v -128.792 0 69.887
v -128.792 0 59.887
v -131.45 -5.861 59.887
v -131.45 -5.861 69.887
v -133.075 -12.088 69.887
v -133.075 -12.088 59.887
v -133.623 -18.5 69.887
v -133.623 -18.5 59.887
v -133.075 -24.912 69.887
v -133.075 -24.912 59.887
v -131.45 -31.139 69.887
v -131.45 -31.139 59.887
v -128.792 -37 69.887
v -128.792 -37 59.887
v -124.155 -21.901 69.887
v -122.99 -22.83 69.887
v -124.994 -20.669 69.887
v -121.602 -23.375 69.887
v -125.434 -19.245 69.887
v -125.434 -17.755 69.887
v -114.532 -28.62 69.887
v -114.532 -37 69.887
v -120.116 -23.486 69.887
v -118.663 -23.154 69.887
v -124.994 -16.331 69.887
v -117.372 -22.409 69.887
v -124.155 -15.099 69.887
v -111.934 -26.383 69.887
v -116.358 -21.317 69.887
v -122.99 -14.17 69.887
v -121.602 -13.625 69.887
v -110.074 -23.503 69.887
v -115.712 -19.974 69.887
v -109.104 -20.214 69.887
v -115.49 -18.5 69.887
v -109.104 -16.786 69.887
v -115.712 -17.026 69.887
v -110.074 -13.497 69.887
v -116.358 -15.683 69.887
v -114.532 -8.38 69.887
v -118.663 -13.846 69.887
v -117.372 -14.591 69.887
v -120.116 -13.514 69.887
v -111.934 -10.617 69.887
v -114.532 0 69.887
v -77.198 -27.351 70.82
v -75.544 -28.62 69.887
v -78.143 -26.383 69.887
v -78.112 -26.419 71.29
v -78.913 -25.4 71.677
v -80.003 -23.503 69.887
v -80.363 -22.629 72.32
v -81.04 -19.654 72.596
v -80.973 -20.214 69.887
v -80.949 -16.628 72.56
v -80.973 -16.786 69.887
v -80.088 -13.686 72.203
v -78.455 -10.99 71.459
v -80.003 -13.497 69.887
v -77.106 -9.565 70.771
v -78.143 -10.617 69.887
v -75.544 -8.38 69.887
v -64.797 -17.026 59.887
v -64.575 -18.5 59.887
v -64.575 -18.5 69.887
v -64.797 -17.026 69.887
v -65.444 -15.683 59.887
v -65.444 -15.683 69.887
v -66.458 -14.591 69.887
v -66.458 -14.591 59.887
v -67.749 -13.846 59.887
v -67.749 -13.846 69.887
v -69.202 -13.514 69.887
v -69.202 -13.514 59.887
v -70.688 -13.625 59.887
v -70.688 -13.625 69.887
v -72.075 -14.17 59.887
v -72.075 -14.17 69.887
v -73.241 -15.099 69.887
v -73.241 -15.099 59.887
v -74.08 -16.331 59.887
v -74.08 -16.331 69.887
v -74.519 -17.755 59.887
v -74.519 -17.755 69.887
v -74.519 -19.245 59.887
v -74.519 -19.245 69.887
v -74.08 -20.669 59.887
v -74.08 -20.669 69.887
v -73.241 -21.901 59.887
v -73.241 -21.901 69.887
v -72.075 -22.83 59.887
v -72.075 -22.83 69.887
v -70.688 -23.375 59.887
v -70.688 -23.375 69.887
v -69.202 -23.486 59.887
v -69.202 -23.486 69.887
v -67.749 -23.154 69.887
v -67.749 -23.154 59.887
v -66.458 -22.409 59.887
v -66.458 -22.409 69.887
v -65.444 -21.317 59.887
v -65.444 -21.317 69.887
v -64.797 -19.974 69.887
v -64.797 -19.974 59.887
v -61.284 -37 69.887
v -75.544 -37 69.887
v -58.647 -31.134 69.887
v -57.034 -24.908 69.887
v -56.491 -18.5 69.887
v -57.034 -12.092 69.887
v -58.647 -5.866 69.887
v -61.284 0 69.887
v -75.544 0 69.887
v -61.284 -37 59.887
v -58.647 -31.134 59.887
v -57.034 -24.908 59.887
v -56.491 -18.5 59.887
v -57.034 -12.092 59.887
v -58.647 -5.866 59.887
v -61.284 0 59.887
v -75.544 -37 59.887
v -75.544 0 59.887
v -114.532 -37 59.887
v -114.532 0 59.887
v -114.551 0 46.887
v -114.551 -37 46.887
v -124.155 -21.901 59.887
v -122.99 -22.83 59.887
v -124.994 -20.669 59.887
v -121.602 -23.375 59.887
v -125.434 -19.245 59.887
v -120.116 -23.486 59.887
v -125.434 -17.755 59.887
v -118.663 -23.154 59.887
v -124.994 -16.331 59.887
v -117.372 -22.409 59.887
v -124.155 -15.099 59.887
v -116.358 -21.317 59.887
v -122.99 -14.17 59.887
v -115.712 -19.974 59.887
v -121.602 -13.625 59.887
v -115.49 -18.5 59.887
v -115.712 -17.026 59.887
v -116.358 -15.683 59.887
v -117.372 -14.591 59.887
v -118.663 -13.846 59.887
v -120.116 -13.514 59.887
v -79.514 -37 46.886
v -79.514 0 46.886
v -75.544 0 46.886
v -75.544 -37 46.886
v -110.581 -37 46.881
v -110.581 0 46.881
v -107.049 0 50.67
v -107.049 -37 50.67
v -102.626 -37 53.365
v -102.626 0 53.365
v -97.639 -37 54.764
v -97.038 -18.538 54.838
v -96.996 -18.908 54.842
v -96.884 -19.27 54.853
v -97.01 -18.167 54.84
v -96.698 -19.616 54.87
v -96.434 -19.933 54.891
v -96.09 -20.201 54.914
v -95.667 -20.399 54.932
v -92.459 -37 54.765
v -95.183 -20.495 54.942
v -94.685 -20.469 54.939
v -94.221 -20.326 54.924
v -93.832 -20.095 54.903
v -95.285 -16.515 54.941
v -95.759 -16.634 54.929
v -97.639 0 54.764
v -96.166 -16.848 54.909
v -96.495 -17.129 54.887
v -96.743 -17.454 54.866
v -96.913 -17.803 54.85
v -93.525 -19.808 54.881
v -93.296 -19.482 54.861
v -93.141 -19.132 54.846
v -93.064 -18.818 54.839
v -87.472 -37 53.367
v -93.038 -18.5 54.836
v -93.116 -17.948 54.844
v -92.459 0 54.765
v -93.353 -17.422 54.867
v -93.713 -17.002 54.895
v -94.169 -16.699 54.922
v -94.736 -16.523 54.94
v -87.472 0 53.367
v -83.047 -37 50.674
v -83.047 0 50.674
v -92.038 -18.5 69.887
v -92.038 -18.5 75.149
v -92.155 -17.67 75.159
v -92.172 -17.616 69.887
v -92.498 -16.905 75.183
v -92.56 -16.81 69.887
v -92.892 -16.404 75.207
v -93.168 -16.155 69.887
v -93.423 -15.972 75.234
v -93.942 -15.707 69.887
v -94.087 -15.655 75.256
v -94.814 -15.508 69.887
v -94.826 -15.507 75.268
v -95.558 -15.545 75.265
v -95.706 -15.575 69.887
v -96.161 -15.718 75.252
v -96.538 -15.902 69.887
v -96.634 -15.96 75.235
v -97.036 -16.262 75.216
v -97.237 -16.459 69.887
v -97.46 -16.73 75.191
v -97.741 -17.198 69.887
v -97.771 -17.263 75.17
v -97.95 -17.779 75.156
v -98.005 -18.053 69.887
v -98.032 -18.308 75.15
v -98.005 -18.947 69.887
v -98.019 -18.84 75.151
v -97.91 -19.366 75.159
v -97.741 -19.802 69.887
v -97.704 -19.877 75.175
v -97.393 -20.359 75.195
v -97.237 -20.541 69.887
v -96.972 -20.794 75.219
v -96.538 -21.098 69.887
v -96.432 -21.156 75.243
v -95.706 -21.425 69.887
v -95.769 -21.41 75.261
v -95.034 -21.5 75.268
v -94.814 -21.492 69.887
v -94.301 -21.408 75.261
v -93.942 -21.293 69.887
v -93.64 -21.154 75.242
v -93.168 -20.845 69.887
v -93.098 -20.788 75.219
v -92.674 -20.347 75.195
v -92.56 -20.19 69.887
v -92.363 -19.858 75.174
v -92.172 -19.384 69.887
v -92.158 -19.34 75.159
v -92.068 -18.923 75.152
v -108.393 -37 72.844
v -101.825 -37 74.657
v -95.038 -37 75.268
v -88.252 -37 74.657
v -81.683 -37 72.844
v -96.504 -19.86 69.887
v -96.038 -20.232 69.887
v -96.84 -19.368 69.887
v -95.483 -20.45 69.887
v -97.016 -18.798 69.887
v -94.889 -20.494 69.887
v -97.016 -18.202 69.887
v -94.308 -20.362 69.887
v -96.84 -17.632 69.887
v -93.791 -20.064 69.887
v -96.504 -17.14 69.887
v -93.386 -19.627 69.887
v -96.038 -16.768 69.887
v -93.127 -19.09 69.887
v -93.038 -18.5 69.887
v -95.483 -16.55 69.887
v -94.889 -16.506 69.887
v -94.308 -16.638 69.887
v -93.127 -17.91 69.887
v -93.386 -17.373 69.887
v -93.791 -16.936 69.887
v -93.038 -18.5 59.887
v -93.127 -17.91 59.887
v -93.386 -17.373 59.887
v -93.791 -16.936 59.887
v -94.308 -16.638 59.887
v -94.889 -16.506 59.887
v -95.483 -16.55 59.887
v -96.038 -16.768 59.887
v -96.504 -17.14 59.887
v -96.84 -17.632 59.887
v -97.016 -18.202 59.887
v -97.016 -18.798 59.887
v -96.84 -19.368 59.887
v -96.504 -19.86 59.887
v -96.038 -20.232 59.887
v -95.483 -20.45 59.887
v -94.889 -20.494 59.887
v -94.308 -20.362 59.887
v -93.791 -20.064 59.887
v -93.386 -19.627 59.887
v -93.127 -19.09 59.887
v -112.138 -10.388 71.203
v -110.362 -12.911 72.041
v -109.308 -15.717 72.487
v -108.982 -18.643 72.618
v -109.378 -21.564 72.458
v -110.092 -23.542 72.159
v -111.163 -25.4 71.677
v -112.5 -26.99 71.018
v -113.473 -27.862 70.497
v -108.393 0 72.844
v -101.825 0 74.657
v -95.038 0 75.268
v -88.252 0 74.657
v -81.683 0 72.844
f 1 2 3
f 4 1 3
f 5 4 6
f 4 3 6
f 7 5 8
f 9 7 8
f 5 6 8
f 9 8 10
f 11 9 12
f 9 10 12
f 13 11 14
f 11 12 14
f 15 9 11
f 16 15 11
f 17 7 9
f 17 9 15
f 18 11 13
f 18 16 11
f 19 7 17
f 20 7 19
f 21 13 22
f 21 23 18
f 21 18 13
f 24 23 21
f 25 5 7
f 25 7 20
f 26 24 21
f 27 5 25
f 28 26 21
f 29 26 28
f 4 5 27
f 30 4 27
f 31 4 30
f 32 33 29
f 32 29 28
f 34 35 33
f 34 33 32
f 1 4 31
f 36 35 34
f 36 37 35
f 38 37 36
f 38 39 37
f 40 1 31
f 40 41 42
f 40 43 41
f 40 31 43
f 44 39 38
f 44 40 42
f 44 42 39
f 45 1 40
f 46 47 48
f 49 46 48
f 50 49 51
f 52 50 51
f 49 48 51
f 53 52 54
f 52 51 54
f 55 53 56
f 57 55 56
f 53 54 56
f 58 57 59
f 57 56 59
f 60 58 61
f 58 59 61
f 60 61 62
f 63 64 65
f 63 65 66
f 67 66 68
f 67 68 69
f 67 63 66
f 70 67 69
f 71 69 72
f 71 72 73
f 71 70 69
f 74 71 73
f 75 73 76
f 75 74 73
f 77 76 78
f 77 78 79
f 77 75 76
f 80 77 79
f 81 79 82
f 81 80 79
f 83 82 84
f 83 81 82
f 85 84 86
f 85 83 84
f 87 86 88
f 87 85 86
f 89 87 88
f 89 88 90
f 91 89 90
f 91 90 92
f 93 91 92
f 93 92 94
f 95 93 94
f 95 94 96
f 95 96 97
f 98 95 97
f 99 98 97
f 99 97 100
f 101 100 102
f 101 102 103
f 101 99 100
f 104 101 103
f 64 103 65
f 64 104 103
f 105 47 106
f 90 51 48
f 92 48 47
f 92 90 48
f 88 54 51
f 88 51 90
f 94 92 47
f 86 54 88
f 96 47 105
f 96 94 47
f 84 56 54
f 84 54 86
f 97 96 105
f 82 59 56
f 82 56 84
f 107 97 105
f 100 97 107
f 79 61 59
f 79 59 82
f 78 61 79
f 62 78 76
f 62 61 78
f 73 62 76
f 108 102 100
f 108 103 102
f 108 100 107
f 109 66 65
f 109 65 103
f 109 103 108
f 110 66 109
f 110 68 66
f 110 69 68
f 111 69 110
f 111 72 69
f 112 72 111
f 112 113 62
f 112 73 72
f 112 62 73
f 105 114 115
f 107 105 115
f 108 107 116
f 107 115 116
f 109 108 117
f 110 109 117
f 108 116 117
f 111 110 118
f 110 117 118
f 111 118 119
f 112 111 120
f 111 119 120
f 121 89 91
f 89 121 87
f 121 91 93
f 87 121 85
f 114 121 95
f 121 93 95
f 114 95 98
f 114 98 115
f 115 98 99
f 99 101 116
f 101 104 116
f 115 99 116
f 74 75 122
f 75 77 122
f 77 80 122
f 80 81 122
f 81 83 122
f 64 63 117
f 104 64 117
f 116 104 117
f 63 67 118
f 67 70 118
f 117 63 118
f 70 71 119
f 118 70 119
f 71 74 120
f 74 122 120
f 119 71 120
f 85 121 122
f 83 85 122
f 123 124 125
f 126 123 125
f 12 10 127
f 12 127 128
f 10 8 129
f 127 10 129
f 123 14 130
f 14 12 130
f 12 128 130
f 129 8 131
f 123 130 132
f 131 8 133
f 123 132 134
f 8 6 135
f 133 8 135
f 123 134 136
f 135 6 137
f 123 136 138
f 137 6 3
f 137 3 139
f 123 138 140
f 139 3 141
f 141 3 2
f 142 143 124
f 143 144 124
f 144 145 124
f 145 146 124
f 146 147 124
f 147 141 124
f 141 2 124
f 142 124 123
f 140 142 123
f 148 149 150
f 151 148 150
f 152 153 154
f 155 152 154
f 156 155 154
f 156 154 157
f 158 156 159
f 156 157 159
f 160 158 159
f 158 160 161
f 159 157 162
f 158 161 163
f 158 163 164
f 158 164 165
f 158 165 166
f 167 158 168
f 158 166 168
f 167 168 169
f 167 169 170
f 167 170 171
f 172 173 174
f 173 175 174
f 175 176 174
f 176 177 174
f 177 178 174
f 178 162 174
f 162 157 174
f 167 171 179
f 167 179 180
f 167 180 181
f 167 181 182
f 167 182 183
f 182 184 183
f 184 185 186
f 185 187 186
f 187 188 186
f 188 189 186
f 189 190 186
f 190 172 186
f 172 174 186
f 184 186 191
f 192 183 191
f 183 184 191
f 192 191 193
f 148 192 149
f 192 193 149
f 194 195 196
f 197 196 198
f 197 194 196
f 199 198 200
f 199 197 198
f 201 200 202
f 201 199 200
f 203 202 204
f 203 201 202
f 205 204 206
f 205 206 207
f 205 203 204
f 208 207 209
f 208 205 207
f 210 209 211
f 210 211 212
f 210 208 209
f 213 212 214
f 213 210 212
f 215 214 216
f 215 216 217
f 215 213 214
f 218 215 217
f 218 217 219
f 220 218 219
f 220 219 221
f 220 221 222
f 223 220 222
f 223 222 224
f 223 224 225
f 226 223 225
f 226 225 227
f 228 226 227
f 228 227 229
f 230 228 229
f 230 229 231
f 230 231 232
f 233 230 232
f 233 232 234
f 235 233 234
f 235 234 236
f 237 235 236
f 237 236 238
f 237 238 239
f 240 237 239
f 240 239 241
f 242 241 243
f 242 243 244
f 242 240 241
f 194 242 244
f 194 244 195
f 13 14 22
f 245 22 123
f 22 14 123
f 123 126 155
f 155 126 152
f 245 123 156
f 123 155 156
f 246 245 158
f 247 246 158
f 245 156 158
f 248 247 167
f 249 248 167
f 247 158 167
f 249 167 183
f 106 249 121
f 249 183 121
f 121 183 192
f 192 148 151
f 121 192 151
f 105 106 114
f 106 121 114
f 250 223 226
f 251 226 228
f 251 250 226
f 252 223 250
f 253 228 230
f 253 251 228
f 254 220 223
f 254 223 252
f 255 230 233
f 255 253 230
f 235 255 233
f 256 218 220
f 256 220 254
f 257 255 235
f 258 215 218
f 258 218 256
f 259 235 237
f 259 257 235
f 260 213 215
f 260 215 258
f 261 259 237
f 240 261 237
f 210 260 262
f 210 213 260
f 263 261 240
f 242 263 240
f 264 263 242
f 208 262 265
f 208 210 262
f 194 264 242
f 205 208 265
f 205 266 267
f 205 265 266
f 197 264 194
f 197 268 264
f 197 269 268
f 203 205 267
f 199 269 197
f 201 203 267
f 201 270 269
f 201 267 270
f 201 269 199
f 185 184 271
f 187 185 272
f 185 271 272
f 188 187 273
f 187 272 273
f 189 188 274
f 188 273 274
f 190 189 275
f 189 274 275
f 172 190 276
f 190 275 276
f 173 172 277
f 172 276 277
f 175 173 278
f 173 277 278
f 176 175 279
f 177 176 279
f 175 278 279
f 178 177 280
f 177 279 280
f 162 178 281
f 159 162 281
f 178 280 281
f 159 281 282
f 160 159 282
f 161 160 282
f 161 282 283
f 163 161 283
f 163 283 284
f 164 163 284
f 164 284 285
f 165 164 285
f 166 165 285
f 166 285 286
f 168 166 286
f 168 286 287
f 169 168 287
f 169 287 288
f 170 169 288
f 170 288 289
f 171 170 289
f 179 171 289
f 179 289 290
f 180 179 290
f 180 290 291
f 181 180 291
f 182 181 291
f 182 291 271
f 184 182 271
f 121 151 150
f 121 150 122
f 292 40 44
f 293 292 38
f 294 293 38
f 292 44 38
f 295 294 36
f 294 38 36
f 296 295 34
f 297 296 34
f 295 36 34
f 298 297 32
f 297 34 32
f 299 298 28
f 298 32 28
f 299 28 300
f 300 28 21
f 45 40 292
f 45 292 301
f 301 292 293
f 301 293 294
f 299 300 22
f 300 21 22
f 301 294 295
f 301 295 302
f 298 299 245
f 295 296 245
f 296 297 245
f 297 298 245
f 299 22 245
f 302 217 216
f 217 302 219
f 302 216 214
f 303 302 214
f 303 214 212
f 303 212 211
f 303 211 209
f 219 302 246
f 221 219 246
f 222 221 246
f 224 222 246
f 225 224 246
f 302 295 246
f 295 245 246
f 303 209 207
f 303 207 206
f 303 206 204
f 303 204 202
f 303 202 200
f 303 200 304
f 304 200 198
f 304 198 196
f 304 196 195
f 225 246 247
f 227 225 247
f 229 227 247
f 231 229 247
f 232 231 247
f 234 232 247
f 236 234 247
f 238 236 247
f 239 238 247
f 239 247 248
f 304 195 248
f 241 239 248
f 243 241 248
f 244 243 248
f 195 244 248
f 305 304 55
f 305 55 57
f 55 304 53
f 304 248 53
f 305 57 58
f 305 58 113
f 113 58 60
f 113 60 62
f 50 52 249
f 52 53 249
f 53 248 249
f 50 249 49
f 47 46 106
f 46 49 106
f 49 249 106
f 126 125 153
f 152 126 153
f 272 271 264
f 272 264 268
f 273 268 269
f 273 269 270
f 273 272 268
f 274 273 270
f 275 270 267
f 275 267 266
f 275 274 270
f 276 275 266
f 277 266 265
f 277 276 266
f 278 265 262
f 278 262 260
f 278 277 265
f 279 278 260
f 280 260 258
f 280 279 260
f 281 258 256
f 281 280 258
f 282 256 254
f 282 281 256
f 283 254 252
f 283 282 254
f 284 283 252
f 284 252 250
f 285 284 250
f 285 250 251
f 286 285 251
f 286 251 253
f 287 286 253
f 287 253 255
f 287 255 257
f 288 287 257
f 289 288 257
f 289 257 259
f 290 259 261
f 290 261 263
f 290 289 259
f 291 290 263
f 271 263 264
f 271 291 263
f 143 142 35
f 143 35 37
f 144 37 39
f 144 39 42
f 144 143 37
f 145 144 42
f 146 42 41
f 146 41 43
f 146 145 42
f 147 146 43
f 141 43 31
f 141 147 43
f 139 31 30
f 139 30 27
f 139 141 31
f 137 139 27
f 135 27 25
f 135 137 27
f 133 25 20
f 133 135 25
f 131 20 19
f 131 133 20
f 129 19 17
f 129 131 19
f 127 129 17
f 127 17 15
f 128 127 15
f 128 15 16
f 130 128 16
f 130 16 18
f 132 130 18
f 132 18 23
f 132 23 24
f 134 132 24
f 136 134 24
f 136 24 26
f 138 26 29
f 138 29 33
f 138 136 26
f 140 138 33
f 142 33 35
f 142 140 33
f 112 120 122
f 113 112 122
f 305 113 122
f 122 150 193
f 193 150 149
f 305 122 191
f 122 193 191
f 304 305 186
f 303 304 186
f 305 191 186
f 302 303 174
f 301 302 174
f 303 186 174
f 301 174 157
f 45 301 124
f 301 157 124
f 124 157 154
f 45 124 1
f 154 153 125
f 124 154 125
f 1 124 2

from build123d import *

# Parameters (mm, degrees)
F1_DEPTH  = 37
F2_R      = 2
F3_DEPTH  = 25.4
F4_R      = 5
F2_W      = 38.9878123262
F2_H      = 37
F5_DEPTH  = 10
F6_R      = 3
F7_DEPTH  = 10
F9_DEPTH  = 25.4
F11_DEPTH = 25.4


with BuildPart() as f1:
    # F0 (on Front) → F1 (new body)
    with BuildSketch(Plane.XZ):
        with BuildLine():
            Line((-75.544338002, 59.8869249225), (-114.5321503282, 59.8869249225))
            Line((-114.5321503282, 59.8869249225), (-114.5509034395, 46.8869249225))
            Line((-114.5509034395, 46.8869249225), (-110.5809034395, 46.8811980108))
            ThreePointArc((-110.5809034395, 46.8811980108), (-95.048956228, 54.9422402402), (-79.514338002, 46.8863465853))
            Line((-79.514338002, 46.8863465853), (-75.544338002, 46.8863465853))
            Line((-75.544338002, 46.8863465853), (-75.544338002, 59.8869249225))
        make_face()
    extrude(amount=F1_DEPTH)

    # F2 (on face) → F3 (cut)
    with BuildSketch(Plane.XY.offset(59.8869249225)):
        with Locations((-95.0382441651, -18.5)):
            Circle(F2_R)
    extrude(amount=-F3_DEPTH, mode=Mode.SUBTRACT)

    # F4 (on face) + F2 (on face) → F5 (join)
    with BuildSketch(Plane.XY.offset(59.8869249225)):
        with BuildLine():
            Line((-75.544338002, -37), (-61.284338002, -37))
            ThreePointArc((-61.284338002, -37), (-56.4913599263, -18.5), (-61.284338002, 0))
            Line((-61.284338002, 0), (-75.544338002, 0))
            Line((-75.544338002, 0), (-75.544338002, -37))
        make_face()
        with Locations((-69.575338002, -18.5)):
            Circle(F4_R, mode=Mode.SUBTRACT)
        with BuildLine():
            Line((-128.7921503282, -37), (-114.5321503282, -37))
            Line((-114.5321503282, -37), (-114.5321503282, 0))
            Line((-114.5321503282, 0), (-128.7921503282, 0))
            ThreePointArc((-128.7921503282, 0), (-133.6226710865, -18.5), (-128.7921503282, -37))
        make_face()
        with Locations((-120.4896494746, -18.5)):
            Circle(F4_R, mode=Mode.SUBTRACT)
    with BuildSketch(Plane.XY.offset(59.8869249225)):
        with Locations((-95.0382441651, -18.5)):
            Rectangle(F2_W, F2_H)
        with Locations((-95.0382441651, -18.5)):
            Circle(F2_R, mode=Mode.SUBTRACT)
    extrude(amount=F5_DEPTH)

    # F6 (on face) → F7 (join)
    with BuildSketch(Plane.XY.offset(69.8869249225)):
        with BuildLine():
            Line((-75.544338002, 0), (-114.5321503282, 0))
            Line((-114.5321503282, 0), (-114.5321503282, -8.38))
            ThreePointArc((-114.5321503282, -8.38), (-108.9808401176, -18.5), (-114.5321503282, -28.62))
            Line((-114.5321503282, -28.62), (-114.5321503282, -37))
            Line((-114.5321503282, -37), (-75.544338002, -37))
            Line((-75.544338002, -37), (-75.544338002, -28.62))
            ThreePointArc((-75.544338002, -28.62), (-81.0956482126, -18.5), (-75.544338002, -8.38))
            Line((-75.544338002, -8.38), (-75.544338002, 0))
        make_face()
        with Locations((-95.0382441651, -18.5)):
            Circle(F6_R, mode=Mode.SUBTRACT)
    extrude(amount=F7_DEPTH)

    # F8 (on face) → F9 (cut)
    with BuildSketch(Plane(origin=(0, 0, 0), x_dir=(-1, 0, 0), z_dir=(0, 1, 0))):
        with BuildLine():
            ThreePointArc((75.544338002, 69.8869249225), (95.0382441651, 75.2681017907), (114.5321503282, 69.8869249225))
            Line((114.5321503282, 69.8869249225), (114.5321503282, 79.8869249225))
            Line((114.5321503282, 79.8869249225), (75.544338002, 79.8869249225))
            Line((75.544338002, 79.8869249225), (75.544338002, 69.8869249225))
        make_face()
    extrude(amount=-F9_DEPTH, mode=Mode.SUBTRACT)

    # F10 (on face) → F11 (cut)
    with BuildSketch(Plane.XZ.offset(37)):
        with BuildLine():
            ThreePointArc((-114.5321503282, 69.8869249225), (-95.0382441651, 75.2681017907), (-75.544338002, 69.8869249225))
            Line((-75.544338002, 69.8869249225), (-75.544338002, 79.8869249225))
            Line((-75.544338002, 79.8869249225), (-114.5321503282, 79.8869249225))
            Line((-114.5321503282, 79.8869249225), (-114.5321503282, 69.8869249225))
        make_face()
    extrude(amount=-F11_DEPTH, mode=Mode.SUBTRACT)


solid = f1.part
